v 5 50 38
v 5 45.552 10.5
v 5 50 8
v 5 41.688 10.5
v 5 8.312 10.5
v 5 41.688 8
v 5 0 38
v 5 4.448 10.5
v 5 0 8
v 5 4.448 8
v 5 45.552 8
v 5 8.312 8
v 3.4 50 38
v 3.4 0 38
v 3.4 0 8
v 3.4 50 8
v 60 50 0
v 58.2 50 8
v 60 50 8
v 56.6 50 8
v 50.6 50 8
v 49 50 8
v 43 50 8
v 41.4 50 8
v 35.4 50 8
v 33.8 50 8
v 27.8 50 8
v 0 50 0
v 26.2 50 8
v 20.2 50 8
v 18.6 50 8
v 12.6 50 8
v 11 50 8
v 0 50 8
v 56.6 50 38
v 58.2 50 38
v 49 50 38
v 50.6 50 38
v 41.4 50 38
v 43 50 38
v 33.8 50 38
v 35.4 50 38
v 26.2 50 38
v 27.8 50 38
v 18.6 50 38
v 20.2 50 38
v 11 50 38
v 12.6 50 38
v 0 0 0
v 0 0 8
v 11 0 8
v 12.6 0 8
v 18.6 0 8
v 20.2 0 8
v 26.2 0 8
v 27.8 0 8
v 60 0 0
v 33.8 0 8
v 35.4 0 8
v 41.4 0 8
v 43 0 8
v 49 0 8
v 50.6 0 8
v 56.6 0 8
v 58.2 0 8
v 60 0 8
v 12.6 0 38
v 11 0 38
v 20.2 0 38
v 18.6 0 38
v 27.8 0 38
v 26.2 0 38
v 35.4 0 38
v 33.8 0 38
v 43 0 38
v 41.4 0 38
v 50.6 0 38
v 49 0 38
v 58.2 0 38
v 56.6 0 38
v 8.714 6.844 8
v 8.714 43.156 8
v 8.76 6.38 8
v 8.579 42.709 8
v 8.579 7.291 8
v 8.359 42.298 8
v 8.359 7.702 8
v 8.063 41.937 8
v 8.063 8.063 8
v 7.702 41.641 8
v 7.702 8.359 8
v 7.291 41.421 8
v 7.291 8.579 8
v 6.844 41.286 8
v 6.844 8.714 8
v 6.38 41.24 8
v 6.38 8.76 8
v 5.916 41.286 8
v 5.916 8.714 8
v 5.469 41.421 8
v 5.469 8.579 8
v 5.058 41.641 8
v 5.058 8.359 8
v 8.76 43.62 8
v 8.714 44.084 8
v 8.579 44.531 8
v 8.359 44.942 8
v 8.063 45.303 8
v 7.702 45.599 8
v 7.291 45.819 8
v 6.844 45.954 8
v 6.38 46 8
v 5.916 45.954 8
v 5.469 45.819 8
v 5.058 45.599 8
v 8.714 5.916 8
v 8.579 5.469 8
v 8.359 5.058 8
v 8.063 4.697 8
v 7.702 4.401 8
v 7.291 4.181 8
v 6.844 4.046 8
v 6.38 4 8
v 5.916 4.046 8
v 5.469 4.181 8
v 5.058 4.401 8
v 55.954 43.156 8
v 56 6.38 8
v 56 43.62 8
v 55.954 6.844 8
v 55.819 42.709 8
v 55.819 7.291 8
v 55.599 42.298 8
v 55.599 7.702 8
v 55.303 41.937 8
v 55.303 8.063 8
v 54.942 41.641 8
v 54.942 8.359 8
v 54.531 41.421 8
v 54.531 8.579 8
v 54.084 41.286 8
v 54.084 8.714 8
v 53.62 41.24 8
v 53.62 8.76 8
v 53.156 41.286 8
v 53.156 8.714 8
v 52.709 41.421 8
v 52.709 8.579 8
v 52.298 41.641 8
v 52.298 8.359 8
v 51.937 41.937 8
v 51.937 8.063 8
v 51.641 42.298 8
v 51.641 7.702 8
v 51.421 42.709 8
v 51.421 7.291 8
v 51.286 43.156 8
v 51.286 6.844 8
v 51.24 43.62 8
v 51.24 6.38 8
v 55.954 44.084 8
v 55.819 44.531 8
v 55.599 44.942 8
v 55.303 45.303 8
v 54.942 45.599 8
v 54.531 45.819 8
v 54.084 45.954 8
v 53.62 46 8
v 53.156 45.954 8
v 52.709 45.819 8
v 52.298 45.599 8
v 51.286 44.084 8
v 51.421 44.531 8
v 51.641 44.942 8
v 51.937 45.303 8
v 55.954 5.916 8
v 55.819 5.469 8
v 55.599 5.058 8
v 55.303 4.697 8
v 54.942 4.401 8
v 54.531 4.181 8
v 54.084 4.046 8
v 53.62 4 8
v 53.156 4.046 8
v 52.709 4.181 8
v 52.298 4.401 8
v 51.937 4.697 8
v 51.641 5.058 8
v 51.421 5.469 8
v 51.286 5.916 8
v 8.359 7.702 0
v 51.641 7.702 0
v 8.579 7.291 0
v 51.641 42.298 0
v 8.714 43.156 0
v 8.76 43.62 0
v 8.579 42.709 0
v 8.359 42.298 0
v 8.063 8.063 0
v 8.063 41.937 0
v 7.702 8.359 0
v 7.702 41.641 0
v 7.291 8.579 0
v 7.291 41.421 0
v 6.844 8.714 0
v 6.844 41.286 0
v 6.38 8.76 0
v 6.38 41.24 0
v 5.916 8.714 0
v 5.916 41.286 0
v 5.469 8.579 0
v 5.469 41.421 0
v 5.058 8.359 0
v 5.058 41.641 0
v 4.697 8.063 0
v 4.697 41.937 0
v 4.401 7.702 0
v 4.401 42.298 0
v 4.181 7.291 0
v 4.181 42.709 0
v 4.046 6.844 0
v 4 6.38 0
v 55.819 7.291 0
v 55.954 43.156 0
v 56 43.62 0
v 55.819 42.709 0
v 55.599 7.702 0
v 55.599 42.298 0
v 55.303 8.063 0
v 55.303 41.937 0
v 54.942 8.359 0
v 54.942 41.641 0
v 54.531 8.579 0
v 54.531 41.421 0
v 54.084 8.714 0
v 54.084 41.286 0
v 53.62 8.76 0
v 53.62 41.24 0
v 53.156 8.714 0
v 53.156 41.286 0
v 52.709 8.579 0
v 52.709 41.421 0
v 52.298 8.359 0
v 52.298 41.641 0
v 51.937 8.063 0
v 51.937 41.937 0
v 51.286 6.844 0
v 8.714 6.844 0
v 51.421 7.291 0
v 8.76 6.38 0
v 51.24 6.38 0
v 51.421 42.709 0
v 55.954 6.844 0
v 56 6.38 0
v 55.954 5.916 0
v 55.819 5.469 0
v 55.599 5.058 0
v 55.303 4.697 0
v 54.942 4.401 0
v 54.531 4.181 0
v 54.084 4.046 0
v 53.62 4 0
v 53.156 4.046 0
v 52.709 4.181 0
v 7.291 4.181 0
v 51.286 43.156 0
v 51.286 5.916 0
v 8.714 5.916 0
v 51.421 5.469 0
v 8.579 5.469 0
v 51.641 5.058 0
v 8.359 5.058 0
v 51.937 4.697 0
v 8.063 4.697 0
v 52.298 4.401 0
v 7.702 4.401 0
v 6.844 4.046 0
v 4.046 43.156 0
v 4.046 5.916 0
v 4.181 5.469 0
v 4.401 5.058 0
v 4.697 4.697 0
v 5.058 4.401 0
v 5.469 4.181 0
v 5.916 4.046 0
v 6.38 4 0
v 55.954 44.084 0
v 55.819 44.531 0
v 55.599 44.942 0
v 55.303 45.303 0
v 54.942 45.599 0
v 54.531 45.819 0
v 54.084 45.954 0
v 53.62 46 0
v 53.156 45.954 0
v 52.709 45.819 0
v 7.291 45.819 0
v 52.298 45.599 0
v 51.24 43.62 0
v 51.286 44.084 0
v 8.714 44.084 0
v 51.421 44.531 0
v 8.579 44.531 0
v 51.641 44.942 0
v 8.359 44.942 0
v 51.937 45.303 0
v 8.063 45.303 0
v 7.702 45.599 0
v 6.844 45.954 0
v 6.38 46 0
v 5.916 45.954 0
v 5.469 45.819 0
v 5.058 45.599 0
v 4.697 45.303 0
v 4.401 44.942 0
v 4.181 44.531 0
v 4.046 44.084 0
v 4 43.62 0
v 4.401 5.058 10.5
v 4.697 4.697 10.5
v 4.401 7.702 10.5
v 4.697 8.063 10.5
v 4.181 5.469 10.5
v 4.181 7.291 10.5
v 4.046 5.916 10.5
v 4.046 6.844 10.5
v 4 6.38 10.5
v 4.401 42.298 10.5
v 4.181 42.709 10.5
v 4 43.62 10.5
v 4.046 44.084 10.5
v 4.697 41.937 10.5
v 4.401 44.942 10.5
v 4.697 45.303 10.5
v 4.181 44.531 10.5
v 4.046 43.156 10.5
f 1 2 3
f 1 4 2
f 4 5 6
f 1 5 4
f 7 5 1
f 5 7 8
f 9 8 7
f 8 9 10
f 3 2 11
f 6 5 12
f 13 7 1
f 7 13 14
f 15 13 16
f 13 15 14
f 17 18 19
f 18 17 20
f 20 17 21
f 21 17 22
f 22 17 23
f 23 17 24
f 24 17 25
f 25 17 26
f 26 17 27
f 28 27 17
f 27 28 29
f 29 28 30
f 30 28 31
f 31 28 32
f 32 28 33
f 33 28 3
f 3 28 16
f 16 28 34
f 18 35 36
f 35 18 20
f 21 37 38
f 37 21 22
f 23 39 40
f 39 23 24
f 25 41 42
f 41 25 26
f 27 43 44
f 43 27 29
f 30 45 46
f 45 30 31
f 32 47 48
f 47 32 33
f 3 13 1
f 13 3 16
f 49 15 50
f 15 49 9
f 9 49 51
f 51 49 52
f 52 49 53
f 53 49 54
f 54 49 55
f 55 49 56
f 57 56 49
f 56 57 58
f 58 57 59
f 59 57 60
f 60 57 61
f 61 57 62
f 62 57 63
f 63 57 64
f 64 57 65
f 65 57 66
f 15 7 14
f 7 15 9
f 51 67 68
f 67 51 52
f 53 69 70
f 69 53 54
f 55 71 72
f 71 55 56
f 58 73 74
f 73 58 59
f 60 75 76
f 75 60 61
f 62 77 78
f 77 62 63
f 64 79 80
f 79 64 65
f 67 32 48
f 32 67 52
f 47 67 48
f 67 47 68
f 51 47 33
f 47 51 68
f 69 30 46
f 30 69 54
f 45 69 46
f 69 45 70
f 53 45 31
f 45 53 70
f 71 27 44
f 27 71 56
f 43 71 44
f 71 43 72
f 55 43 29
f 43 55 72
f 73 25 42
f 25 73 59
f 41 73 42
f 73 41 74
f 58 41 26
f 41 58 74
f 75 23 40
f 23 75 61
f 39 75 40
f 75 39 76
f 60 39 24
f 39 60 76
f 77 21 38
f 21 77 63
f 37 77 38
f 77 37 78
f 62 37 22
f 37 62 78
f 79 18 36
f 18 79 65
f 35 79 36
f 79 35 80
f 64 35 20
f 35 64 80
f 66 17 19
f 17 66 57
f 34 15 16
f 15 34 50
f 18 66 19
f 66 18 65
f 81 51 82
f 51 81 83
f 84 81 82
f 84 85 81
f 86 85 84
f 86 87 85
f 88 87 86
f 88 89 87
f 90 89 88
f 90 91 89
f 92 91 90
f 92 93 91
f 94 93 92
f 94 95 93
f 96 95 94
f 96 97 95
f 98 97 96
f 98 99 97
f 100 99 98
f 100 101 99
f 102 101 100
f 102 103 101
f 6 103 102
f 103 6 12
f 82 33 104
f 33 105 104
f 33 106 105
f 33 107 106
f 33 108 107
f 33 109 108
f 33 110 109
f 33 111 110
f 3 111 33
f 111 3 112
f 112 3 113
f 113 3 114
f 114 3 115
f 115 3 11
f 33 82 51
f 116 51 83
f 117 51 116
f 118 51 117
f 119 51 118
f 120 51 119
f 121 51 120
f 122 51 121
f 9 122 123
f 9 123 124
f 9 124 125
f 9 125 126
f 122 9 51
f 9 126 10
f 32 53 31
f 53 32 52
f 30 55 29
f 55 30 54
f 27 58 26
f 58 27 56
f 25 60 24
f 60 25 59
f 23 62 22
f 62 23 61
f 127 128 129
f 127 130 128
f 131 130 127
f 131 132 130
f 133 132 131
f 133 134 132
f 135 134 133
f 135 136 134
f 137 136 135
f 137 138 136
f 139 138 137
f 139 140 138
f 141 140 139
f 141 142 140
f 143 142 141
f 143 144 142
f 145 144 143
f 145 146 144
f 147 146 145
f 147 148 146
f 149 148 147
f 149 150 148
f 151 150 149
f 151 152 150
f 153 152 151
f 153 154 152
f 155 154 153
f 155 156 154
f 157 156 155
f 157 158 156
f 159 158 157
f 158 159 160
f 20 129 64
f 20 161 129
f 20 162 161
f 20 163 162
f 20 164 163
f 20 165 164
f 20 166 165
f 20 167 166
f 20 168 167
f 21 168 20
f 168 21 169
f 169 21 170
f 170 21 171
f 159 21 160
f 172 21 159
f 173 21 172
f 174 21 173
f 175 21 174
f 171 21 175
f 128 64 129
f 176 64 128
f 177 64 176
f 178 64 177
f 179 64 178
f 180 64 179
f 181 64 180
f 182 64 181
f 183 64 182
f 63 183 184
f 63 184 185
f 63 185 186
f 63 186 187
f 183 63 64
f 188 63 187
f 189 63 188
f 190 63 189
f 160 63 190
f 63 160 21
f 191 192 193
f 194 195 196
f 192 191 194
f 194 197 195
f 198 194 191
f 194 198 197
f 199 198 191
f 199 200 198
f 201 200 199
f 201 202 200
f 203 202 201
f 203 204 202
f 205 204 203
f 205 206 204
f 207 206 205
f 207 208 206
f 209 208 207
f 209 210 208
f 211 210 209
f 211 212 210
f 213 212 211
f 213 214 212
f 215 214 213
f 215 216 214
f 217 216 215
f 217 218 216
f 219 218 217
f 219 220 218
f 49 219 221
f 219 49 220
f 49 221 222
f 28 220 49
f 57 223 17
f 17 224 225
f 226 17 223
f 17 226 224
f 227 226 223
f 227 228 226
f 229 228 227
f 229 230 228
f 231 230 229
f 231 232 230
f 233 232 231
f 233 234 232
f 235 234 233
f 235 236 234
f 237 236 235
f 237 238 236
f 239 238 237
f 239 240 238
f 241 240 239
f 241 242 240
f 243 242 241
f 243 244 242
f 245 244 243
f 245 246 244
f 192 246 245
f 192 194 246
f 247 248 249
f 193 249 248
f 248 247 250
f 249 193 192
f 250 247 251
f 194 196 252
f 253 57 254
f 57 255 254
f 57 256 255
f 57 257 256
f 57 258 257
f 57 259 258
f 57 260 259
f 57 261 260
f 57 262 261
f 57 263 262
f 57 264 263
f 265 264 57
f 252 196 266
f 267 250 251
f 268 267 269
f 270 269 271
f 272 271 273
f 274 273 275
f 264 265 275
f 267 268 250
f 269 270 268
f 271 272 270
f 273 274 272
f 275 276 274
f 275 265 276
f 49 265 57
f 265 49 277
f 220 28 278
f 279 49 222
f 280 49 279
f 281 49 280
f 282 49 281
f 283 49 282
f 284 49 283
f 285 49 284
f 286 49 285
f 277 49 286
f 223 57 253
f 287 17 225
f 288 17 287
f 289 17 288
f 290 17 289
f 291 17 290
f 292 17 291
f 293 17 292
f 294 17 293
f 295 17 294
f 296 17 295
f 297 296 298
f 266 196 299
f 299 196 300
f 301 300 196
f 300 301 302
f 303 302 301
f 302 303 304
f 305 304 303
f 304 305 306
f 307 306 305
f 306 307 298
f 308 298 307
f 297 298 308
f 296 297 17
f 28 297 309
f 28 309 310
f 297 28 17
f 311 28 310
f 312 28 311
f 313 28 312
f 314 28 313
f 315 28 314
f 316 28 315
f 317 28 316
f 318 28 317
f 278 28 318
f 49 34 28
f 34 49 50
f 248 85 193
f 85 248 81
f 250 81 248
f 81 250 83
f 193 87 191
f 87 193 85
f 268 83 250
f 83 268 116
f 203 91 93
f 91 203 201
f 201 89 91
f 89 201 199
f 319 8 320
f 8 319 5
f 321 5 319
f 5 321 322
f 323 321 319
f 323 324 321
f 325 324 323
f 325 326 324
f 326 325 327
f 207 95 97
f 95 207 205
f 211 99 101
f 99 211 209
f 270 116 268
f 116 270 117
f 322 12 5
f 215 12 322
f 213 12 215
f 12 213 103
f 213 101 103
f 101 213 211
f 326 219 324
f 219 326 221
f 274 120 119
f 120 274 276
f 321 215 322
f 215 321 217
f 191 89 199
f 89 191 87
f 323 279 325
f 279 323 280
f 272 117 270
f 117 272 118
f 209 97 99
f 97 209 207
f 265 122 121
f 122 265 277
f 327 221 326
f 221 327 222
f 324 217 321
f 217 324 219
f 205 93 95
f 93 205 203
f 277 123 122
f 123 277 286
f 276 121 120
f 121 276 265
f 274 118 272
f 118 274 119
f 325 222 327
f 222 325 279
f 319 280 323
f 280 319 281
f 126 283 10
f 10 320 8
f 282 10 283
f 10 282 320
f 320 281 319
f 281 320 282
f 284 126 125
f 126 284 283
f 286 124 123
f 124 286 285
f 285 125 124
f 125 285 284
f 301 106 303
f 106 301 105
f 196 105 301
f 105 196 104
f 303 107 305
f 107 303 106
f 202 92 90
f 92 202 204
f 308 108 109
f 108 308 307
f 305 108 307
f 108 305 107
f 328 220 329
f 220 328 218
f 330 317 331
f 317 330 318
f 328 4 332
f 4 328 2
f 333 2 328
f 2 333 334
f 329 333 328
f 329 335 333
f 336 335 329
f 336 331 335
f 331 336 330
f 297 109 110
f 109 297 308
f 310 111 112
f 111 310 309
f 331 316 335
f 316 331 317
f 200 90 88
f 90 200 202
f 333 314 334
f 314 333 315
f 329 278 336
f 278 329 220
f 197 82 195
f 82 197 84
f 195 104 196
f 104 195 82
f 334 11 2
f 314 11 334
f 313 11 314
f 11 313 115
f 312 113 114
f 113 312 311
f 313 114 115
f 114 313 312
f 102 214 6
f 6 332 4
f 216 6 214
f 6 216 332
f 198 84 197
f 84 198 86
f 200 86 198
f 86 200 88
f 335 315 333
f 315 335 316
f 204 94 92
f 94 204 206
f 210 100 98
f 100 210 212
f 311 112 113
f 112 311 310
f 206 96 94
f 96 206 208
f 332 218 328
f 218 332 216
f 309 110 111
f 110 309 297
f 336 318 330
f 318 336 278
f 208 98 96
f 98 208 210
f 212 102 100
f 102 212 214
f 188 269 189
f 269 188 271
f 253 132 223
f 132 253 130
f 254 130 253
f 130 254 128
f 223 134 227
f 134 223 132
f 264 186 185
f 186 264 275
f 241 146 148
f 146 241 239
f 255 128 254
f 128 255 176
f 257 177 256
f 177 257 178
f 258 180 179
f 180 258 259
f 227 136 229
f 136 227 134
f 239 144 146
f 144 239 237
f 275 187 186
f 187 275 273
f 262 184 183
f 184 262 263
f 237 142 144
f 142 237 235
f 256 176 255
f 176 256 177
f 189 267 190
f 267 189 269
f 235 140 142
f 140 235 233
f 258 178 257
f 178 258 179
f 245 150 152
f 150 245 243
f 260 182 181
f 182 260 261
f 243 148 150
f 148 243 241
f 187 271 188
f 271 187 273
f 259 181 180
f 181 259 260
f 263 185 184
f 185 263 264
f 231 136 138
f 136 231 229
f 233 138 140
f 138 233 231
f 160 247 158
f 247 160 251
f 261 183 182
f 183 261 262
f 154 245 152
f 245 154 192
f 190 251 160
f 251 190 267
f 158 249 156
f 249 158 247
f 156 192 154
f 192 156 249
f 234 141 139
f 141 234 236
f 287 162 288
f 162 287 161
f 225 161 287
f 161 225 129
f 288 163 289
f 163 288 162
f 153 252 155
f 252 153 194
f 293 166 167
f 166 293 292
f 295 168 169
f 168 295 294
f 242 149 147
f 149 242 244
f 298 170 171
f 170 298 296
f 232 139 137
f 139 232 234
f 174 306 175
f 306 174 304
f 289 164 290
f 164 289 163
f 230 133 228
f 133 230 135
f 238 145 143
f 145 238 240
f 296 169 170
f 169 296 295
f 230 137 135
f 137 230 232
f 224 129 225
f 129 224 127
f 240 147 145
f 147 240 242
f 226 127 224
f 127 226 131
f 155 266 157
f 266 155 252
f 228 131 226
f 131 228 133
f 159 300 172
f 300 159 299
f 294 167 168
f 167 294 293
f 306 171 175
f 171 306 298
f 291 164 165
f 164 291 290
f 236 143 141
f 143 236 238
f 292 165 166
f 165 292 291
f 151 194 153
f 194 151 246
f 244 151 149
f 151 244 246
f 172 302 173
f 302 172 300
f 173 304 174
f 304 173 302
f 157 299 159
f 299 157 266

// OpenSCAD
$fn = 32;

// ----------------------------------------------------------------------
// Finned heat sink: 60 x 50 mm base, 30 mm fins
// ----------------------------------------------------------------------

// --- parameters (mm) ---
base_w = 60;              // base width
base_d = 50;              // base depth
base_t = 8;               // base thickness
fin_h = 30;               // fin height above the base
holes_d = 4.76;           // fixing holes
hole_x = 23.62;           // hole offset in x
hole_y = 18.62;           // hole offset in y
fin_t = 1.6;              // fin thickness
fin_pitch = 7.6;          // fin pitch
fin_count = 8;            // number of fins
fin_x0 = 3.4;             // first fin offset

difference() {
  union() {
    cube([base_w, base_d, base_t]);
    for (i = [0 : fin_count - 1]) {
      translate([fin_x0 + i * fin_pitch, 0, base_t - 0.5]) cube([fin_t, base_d, fin_h + 0.5]);
    }
  }
  /* fixing holes through the base, 2.5 mm clear on both sides */
  for (hx = [-23.62, 23.62]) {
    for (hy = [-18.62, 18.62]) {
      translate([base_w / 2 + hx, base_d / 2 + hy, -2.5]) cylinder(h = base_t + 5, d = holes_d);
    }
  }
}
